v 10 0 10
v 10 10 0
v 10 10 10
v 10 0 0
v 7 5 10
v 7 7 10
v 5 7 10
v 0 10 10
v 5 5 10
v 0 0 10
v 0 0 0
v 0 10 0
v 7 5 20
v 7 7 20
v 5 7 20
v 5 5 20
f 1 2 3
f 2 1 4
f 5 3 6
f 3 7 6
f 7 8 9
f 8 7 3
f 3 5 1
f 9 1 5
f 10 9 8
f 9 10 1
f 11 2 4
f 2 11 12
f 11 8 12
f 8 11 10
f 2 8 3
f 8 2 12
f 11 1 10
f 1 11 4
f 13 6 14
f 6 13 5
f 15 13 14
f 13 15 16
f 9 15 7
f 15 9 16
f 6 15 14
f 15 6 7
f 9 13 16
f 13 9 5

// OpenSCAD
// file: lib/parts-lib.scad
// Helper for overlap-via-use.scad: a peg whose primitive lives in this file.
module pin() {
  translate([5, 5, 0]) cube([2, 2, 20]);
}
// main file
// The colliding primitive is defined in another file. Its chain must keep only
// the steps from this file: the pin() call, not the translate/cube inside it.
use <lib/parts-lib.scad>
cube(10);  // part 1
pin();     // part 2: 2x2 peg through the cube, overlap volume 40
